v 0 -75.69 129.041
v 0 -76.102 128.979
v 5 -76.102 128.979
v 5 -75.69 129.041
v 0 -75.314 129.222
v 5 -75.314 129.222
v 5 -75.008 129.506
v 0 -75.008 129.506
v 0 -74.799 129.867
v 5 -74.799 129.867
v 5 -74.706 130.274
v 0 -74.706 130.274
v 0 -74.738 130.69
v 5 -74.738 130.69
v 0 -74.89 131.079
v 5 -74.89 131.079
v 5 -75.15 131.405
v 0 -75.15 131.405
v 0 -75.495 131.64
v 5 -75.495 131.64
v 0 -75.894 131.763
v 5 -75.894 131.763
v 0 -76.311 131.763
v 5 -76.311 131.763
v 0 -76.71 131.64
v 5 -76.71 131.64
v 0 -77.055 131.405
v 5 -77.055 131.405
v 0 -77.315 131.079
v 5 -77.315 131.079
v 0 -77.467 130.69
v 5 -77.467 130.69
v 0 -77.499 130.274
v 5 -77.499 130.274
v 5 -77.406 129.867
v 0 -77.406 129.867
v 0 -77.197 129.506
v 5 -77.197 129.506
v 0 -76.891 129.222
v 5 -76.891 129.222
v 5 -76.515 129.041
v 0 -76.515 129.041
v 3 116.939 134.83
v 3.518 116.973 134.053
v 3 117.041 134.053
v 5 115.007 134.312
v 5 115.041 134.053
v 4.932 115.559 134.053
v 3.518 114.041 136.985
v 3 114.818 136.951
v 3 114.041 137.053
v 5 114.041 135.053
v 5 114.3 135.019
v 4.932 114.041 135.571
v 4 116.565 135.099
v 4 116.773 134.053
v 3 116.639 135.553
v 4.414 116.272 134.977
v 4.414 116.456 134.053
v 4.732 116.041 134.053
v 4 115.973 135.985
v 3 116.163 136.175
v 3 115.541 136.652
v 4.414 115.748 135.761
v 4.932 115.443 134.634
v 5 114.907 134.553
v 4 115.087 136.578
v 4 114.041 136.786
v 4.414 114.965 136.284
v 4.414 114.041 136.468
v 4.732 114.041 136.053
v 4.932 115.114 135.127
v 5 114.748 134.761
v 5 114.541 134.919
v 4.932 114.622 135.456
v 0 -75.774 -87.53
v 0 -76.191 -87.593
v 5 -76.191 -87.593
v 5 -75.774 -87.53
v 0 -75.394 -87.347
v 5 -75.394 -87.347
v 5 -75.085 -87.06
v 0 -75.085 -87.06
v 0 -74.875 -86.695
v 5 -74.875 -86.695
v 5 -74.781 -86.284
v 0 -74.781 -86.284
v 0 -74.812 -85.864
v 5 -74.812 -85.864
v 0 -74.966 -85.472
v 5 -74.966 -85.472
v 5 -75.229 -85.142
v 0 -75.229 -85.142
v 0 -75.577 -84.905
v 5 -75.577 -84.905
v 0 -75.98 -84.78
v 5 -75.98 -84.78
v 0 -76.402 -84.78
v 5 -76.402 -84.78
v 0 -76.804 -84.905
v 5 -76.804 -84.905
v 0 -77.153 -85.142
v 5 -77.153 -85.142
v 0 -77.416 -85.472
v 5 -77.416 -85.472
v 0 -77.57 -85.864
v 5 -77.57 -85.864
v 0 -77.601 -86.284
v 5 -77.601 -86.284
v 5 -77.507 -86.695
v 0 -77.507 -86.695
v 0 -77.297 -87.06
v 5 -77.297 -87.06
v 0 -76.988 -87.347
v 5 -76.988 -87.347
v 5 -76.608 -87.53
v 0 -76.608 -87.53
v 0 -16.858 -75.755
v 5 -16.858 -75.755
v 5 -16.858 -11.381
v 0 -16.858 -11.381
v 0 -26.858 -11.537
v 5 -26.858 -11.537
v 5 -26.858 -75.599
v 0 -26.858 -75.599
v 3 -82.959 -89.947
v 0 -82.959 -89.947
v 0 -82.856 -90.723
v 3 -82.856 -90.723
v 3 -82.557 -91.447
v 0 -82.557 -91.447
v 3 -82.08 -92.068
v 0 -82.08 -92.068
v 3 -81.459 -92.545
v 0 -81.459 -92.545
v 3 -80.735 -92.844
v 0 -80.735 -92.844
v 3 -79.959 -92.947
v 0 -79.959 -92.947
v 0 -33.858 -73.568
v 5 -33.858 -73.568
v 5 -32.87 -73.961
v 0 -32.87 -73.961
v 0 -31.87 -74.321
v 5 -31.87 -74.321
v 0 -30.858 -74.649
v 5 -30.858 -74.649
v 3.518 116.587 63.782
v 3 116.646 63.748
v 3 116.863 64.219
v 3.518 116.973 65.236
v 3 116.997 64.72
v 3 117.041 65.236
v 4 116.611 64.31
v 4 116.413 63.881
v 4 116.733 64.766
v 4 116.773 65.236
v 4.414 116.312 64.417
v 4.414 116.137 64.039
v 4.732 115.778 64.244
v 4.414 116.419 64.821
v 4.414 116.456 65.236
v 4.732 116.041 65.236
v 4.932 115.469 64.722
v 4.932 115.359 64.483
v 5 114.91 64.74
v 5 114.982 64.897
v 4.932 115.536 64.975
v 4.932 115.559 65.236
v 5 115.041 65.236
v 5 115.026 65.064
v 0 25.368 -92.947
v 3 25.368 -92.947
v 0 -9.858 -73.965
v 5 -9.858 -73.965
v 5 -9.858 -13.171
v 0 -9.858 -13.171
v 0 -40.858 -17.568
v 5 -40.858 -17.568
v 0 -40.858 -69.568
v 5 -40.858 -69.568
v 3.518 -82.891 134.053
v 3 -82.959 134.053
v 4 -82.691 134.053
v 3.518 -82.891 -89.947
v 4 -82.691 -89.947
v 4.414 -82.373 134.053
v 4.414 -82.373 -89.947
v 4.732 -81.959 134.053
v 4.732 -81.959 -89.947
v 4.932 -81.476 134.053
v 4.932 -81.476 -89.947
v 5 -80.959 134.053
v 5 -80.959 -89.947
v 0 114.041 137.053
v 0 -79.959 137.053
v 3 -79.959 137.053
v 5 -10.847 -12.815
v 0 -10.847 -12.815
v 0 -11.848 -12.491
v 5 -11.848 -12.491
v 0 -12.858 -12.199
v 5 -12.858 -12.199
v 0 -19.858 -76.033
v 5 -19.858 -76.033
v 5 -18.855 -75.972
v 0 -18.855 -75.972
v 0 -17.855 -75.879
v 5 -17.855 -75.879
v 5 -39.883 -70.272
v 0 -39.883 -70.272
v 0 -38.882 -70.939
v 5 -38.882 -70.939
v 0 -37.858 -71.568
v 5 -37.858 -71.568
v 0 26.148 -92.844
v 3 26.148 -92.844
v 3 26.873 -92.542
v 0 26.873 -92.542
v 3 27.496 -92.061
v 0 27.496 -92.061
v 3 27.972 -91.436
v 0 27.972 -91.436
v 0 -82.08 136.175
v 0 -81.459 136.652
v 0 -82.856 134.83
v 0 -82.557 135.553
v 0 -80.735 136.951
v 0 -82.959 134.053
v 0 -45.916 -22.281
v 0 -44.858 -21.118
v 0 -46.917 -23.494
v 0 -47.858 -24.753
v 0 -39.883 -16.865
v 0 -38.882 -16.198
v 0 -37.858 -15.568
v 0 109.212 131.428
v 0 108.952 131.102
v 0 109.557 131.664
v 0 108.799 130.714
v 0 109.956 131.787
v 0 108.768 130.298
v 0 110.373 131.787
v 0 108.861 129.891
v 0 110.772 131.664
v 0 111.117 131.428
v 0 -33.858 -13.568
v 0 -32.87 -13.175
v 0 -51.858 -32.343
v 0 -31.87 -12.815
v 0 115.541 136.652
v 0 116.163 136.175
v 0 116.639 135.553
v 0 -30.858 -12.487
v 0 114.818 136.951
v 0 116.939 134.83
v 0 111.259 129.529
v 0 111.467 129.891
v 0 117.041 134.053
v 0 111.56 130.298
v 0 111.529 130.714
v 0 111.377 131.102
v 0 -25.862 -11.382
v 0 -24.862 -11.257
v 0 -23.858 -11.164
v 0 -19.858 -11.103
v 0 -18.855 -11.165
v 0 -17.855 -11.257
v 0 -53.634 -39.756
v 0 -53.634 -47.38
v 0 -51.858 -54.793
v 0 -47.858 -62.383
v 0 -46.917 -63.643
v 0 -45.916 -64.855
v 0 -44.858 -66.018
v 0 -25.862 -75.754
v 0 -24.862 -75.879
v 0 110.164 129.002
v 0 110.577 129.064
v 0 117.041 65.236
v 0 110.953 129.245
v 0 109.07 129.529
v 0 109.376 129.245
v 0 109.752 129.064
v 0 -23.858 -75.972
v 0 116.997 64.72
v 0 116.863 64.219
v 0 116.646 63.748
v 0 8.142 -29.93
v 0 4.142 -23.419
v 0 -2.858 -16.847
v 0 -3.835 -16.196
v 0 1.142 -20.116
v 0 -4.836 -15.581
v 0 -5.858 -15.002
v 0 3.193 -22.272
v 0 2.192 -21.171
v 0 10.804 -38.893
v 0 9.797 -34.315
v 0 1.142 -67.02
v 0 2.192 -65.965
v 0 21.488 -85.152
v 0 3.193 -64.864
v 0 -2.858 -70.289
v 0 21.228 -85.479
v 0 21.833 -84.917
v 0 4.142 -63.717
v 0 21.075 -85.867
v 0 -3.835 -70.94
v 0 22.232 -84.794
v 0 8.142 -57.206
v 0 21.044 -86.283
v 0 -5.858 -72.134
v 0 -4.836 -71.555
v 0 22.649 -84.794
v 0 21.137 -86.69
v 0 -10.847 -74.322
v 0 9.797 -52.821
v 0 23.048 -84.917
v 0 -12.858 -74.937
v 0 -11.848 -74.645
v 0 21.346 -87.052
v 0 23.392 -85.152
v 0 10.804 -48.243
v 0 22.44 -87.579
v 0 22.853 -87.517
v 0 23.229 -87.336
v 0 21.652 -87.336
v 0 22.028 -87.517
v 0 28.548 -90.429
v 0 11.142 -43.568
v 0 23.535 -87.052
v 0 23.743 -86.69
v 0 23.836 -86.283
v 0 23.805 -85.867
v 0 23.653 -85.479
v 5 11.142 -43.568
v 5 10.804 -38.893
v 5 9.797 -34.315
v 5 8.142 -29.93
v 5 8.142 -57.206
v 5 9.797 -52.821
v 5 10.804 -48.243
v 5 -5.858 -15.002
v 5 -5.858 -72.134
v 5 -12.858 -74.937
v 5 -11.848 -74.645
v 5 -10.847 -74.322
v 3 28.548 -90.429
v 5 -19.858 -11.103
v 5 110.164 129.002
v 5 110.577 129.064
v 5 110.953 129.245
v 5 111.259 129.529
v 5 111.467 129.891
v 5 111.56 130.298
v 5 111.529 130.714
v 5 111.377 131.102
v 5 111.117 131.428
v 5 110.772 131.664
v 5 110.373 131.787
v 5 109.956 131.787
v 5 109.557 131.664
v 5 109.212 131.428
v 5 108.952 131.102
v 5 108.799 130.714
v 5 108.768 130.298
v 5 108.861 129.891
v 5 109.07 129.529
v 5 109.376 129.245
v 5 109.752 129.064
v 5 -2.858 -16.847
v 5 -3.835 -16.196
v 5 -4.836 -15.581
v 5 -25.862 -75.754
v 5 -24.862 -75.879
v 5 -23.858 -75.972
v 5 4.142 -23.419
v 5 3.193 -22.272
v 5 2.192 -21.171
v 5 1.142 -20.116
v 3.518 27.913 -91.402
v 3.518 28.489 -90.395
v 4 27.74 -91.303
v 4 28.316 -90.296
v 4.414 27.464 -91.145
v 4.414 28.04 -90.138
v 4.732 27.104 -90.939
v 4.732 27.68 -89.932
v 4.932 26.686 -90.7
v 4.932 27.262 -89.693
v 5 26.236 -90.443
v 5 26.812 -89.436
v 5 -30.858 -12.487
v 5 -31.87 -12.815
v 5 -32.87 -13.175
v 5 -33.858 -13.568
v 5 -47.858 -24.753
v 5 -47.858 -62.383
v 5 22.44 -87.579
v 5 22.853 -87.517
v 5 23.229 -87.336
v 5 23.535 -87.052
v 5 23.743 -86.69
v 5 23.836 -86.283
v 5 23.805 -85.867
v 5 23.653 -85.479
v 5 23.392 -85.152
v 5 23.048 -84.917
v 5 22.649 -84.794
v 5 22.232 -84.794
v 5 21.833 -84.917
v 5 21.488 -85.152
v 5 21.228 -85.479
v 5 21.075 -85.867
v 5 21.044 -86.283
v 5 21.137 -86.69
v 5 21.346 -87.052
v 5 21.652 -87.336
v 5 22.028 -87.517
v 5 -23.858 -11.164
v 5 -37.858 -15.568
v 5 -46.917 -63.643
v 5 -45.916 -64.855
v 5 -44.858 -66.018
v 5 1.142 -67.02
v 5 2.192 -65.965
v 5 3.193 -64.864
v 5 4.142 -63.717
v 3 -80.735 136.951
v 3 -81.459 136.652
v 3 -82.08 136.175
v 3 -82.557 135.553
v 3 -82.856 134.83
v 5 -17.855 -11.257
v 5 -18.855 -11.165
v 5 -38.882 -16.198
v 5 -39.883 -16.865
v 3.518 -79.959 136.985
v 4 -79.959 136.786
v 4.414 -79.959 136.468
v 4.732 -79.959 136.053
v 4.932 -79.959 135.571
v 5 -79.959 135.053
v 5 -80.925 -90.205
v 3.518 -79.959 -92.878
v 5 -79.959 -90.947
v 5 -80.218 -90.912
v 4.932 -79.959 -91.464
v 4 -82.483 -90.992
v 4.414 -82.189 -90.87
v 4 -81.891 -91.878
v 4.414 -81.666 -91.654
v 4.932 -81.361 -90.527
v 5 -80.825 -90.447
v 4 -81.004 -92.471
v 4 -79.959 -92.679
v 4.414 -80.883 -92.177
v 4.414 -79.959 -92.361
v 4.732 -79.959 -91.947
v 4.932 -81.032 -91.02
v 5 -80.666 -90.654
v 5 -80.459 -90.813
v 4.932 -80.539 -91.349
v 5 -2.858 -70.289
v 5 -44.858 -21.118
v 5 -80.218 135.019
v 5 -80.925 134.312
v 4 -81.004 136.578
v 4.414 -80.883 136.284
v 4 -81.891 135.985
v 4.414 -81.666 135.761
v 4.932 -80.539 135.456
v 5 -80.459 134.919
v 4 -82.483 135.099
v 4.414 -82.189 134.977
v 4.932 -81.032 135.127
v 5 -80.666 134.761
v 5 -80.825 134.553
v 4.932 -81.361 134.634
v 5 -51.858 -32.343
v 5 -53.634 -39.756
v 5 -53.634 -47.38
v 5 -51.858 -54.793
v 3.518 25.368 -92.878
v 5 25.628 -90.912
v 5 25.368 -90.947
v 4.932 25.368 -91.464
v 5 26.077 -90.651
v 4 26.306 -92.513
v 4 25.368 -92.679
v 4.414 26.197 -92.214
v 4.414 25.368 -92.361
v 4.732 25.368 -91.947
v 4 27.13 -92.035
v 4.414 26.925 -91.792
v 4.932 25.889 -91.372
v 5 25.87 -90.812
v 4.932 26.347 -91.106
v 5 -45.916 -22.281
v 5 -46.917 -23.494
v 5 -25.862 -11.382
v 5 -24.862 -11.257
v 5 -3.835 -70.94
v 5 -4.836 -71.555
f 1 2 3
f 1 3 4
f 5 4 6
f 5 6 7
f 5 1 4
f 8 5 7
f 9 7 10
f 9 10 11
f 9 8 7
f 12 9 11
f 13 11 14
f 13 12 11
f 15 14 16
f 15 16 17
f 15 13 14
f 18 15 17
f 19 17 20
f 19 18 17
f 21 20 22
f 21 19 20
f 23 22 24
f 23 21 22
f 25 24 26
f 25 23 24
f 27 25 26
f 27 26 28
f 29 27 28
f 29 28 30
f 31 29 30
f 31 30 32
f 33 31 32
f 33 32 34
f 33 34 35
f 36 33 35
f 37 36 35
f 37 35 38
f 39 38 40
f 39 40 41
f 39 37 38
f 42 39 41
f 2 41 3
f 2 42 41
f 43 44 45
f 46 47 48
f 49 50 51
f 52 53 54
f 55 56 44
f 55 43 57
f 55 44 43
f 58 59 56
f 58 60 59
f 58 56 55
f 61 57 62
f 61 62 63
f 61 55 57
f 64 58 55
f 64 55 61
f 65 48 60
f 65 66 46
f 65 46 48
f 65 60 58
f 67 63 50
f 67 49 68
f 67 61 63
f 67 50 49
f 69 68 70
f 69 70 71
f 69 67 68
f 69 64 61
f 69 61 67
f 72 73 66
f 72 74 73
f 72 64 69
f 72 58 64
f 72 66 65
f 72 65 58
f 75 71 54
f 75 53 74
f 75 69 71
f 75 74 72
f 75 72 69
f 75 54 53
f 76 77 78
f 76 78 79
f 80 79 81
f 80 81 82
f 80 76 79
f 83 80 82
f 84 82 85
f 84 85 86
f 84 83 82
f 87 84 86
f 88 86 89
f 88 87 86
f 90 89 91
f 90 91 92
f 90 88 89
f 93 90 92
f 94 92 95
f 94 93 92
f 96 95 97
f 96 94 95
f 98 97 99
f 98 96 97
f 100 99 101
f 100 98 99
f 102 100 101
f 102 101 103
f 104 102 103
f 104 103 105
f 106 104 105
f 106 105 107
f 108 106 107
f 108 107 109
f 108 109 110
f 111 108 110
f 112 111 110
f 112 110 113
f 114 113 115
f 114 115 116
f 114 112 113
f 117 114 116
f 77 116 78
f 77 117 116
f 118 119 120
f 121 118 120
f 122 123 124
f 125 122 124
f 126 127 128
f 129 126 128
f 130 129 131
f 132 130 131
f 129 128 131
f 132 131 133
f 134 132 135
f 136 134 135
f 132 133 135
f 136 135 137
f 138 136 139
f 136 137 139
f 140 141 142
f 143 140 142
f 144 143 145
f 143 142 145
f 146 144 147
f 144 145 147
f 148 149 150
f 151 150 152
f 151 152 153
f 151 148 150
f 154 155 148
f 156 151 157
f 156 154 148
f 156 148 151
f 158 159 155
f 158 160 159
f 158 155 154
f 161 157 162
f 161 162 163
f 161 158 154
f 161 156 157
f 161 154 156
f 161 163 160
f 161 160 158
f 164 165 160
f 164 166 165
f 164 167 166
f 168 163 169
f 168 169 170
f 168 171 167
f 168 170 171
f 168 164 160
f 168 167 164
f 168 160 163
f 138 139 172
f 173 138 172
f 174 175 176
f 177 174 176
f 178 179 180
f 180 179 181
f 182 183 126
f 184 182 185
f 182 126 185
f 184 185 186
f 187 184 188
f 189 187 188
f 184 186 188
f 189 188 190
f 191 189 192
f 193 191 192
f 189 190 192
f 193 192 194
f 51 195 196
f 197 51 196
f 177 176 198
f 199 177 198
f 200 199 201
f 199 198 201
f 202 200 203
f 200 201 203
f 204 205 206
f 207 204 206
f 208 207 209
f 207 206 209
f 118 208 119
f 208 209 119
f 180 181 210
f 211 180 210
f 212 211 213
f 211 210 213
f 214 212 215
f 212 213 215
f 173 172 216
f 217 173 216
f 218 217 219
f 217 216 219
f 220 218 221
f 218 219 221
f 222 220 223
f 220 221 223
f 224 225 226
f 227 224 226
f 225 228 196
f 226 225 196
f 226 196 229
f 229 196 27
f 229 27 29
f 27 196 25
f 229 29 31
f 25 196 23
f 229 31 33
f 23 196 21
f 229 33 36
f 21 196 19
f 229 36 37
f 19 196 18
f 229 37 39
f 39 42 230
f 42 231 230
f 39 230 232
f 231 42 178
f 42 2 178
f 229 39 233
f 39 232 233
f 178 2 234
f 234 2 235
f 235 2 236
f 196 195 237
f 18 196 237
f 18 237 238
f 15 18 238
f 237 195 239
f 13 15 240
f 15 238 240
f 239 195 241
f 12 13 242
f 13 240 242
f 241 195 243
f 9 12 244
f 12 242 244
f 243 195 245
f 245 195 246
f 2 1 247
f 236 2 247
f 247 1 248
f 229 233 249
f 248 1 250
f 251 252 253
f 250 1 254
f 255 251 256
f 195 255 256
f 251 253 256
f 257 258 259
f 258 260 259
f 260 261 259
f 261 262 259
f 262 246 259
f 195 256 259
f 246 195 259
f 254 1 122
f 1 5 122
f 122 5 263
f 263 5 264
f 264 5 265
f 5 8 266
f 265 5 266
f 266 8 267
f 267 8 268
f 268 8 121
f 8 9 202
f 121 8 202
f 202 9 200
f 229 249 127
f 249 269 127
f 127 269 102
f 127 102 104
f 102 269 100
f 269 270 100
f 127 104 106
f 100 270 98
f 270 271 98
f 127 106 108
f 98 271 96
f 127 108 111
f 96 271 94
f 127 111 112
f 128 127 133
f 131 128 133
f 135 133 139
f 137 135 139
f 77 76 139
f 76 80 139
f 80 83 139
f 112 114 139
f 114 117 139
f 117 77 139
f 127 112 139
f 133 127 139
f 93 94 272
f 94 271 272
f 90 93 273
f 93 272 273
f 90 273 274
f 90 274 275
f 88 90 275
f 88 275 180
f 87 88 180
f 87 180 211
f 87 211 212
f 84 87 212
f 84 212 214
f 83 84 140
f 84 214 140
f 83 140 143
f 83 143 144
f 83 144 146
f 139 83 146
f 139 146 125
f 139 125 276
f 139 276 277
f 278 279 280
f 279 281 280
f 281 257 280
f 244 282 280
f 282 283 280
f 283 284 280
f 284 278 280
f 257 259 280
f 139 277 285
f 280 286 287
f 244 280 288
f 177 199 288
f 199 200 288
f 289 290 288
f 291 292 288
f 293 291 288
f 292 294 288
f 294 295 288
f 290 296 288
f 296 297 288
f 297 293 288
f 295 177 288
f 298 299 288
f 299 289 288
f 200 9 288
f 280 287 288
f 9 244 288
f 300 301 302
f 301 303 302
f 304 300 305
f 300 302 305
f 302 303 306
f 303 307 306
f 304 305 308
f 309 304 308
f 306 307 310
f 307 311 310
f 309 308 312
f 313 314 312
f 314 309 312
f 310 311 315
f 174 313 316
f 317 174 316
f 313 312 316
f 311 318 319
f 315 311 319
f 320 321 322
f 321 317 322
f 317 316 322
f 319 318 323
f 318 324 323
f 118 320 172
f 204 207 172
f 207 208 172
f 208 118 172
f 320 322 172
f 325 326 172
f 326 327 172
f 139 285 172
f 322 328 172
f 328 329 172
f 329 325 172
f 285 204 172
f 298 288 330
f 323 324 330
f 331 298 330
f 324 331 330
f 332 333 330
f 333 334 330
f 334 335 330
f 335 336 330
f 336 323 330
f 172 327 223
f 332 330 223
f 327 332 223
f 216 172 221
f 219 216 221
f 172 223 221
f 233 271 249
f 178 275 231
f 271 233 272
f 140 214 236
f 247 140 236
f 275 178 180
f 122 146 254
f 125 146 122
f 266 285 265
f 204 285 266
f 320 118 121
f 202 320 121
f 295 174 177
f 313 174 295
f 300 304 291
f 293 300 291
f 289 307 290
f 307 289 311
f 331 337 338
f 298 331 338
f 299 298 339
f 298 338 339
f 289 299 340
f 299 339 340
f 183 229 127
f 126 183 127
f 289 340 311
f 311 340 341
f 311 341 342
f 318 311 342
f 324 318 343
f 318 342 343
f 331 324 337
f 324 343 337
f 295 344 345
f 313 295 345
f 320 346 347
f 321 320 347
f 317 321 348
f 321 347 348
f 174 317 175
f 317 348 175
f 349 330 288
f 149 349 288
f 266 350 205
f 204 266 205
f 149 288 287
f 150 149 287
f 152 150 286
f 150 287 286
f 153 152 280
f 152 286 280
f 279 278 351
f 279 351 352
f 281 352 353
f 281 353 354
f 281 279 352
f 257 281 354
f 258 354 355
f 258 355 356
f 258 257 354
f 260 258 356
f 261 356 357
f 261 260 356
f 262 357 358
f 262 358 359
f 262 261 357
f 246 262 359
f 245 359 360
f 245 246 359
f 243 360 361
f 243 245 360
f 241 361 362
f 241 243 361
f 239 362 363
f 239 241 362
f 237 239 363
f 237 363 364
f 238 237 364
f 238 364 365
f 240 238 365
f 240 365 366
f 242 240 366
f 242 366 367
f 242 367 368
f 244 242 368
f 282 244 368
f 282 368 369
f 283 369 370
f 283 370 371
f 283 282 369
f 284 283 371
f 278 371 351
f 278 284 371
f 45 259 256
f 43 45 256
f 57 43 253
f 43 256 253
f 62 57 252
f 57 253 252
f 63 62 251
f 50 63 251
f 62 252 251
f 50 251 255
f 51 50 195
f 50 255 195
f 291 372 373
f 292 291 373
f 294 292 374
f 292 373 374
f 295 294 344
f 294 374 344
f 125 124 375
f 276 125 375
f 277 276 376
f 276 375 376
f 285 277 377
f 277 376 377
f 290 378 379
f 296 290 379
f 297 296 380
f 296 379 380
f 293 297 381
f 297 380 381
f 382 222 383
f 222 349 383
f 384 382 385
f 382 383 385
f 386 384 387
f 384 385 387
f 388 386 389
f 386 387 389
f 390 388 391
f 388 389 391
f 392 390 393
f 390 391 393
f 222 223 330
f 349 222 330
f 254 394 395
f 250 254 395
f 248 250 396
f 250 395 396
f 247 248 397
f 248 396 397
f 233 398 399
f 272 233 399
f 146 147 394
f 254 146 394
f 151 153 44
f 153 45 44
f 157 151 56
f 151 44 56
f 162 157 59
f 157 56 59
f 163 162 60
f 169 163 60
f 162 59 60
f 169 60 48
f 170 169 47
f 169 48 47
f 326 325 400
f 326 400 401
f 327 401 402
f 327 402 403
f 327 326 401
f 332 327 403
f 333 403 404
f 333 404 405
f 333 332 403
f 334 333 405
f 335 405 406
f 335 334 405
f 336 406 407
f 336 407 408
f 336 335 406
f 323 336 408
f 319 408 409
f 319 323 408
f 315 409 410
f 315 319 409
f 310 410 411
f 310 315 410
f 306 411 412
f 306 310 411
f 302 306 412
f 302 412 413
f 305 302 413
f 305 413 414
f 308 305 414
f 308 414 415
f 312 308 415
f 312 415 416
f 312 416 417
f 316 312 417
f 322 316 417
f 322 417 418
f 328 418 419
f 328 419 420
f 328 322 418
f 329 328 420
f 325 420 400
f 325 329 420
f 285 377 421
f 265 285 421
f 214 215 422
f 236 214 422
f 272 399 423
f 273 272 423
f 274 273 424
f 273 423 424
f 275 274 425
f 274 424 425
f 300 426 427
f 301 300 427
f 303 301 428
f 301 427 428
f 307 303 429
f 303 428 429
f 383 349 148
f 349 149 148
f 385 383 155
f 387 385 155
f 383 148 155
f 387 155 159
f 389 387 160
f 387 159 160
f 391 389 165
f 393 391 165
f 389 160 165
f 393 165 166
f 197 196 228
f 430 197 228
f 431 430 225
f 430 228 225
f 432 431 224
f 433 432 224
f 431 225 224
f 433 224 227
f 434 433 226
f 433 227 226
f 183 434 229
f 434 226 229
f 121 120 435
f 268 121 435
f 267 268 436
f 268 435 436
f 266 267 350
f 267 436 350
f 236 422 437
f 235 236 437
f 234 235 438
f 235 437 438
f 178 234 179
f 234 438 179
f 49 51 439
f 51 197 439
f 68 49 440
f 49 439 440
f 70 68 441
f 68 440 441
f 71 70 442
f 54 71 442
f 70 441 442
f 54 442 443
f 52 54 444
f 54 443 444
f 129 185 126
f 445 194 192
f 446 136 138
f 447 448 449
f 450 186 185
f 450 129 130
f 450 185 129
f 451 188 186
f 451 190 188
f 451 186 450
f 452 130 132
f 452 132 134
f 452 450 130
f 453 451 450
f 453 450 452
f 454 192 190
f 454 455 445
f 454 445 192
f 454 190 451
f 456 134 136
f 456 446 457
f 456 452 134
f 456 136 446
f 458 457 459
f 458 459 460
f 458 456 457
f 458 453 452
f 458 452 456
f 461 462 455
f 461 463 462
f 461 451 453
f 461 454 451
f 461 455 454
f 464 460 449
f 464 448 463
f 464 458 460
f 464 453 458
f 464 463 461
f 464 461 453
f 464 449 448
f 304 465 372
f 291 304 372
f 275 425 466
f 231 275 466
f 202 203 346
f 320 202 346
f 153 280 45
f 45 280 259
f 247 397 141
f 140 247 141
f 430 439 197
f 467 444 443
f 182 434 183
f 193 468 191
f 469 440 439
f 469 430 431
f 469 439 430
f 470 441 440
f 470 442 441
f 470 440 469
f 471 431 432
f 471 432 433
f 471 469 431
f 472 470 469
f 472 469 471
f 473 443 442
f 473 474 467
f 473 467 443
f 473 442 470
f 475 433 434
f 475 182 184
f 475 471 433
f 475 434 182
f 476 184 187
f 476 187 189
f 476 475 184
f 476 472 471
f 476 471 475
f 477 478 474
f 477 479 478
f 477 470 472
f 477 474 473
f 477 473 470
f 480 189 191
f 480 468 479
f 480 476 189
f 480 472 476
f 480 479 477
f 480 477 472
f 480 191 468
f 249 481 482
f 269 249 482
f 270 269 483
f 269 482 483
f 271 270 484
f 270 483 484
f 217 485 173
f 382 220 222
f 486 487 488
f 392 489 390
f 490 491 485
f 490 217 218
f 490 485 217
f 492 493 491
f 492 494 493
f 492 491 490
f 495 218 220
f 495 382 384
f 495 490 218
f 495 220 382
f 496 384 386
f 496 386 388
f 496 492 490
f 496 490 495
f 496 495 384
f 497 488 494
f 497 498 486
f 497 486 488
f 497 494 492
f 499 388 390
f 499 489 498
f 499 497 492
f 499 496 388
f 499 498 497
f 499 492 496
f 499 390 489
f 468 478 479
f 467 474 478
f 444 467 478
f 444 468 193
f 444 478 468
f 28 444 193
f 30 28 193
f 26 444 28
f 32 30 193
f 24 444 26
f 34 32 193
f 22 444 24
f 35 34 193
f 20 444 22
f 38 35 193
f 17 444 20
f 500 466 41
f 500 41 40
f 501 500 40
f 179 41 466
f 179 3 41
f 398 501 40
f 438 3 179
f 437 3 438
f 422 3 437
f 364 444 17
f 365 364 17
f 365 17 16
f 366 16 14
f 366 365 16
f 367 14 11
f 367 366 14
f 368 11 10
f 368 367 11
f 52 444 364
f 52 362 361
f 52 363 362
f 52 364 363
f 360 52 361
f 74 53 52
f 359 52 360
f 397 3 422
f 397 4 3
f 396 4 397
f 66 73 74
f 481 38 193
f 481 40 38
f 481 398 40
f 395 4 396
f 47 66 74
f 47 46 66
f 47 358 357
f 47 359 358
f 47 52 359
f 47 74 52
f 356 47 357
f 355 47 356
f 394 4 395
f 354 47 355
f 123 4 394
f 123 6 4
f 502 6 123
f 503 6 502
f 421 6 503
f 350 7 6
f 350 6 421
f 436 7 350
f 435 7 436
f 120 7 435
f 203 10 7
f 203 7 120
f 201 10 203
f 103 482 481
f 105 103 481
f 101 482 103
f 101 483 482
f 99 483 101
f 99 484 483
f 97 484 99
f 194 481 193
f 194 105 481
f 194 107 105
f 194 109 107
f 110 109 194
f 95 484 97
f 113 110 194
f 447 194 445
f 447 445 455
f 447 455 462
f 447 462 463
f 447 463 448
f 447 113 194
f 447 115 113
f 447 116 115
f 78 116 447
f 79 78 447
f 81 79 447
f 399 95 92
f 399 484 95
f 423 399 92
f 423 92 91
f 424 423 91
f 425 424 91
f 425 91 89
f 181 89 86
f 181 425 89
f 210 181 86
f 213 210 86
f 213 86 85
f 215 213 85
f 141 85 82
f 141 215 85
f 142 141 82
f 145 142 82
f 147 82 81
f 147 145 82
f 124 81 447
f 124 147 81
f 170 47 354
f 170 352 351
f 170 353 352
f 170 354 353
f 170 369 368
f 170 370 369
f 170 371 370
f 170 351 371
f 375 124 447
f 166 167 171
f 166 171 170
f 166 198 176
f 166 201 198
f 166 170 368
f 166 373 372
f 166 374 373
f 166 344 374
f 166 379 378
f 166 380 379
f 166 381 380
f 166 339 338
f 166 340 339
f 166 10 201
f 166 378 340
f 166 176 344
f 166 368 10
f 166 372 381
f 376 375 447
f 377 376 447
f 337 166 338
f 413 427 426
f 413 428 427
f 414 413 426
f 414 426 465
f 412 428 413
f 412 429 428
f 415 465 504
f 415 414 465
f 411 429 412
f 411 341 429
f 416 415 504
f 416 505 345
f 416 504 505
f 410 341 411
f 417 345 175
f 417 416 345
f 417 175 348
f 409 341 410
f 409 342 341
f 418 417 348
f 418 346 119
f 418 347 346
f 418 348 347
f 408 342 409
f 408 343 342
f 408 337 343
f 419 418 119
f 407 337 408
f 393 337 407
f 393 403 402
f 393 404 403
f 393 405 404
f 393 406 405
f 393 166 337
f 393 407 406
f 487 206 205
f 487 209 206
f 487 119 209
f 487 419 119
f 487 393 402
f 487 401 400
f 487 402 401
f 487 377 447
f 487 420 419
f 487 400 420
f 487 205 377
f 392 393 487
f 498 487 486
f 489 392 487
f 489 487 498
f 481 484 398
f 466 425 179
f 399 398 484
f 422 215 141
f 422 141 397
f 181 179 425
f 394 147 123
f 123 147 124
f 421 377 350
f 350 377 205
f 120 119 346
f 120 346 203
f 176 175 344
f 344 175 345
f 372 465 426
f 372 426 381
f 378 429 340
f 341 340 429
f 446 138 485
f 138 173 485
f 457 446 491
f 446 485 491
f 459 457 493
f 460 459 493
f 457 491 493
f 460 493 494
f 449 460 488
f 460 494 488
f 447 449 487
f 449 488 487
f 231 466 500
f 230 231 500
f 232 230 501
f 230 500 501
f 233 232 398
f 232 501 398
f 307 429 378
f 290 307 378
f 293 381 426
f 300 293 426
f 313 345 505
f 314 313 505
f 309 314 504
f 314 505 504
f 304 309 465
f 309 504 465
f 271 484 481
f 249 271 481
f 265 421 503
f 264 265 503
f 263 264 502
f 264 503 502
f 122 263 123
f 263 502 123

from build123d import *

# Parameters (mm, degrees)
SKETCH2_R           = 1.4
SKETCH2_R_2         = 1.414097505
BOSS_EXTRUDE2_DEPTH = 5
CUT_EXTRUDE1_DEPTH  = 5
FILLET4_R           = 2


with BuildPart() as part:
    # Sketch2 → Boss-Extrude2 (new body)
    with BuildSketch(Plane(origin=(0, 0, 0), x_dir=(0, 0, -1), z_dir=(1, 0, 0))):
        with BuildLine():
            Line((-137.05346623, 114.041314814), (-137.05346623, -79.958685186))
            ThreePointArc((-137.05346623, -79.958685186), (-136.174786573, -82.08000553), (-134.05346623, -82.958685186))
            Line((-134.05346623, -82.958685186), (89.94653377, -82.958685186))
            ThreePointArc((89.94653377, -82.958685186), (92.067854114, -82.08000553), (92.94653377, -79.958685186))
            Line((92.94653377, -79.958685186), (92.94653377, 25.368162352))
            ThreePointArc((92.94653377, 25.368162352), (92.541535124, 26.8734756), (91.435888454, 27.97235563))
            Line((91.435888454, 27.97235563), (90.428791577, 28.548320734))
            Line((90.428791577, 28.548320734), (-63.7480103, 116.646068127))
            ThreePointArc((-63.7480103, 116.646068127), (-64.466404774, 116.940819939), (-65.236385313, 117.041314814))
            Line((-65.236385313, 117.041314814), (-134.05346623, 117.041314814))
            ThreePointArc((-134.05346623, 117.041314814), (-136.174786573, 116.162635157), (-137.05346623, 114.041314814))
        make_face()
        with Locations((-130.402194721, 110.164268622)):
            Circle(SKETCH2_R, mode=Mode.SUBTRACT)
        with Locations((-130.378834203, -76.102450402)):
            Circle(SKETCH2_R, mode=Mode.SUBTRACT)
        with Locations((86.178766817, -76.190918233)):
            Circle(SKETCH2_R_2, mode=Mode.SUBTRACT)
        with Locations((86.178766817, 22.440231448)):
            Circle(SKETCH2_R, mode=Mode.SUBTRACT)
    extrude(amount=BOSS_EXTRUDE2_DEPTH)

    # Sketch3 → Cut-Extrude1 (cut)
    with BuildSketch(Plane(origin=(5, 0, 0), x_dir=(0, 0, -1), z_dir=(1, 0, 0))):
        with BuildLine():
            ThreePointArc((43.568031387, 11.142105509), (36.585911365, 10.383246006), (29.92984969, 8.142105509))
            Line((29.92984969, 8.142105509), (57.206213084, 8.142105509))
            ThreePointArc((57.206213084, 8.142105509), (50.550151409, 10.383246006), (43.568031387, 11.142105509))
        make_face()
        with BuildLine():
            ThreePointArc((23.418589707, 4.142105509), (21.715728373, 2.69884787), (20.115952588, 1.142105509))
            Line((20.115952588, 1.142105509), (67.020110186, 1.142105509))
            ThreePointArc((67.020110186, 1.142105509), (65.420334401, 2.69884787), (63.717473066, 4.142105509))
            Line((63.717473066, 4.142105509), (23.418589707, 4.142105509))
        make_face()
        with BuildLine():
            Line((70.288809819, -2.857894491), (16.847252955, -2.857894491))
            ThreePointArc((16.847252955, -2.857894491), (15.884118126, -4.332885047), (15.002317673, -5.857894491))
            Line((15.002317673, -5.857894491), (72.133745101, -5.857894491))
            ThreePointArc((72.133745101, -5.857894491), (71.251944648, -4.332885047), (70.288809819, -2.857894491))
        make_face()
        with BuildLine():
            Line((73.965399694, -9.857894491), (13.17066308, -9.857894491))
            ThreePointArc((13.17066308, -9.857894491), (12.648553826, -11.346106069), (12.199257104, -12.857894491))
            Line((12.199257104, -12.857894491), (74.93680567, -12.857894491))
            ThreePointArc((74.93680567, -12.857894491), (74.487508947, -11.346106069), (73.965399694, -9.857894491))
        make_face()
        with BuildLine():
            Line((75.754985266, -16.857894491), (11.381077508, -16.857894491))
            ThreePointArc((11.381077508, -16.857894491), (11.207088544, -18.354666502), (11.102665225, -19.857894491))
            Line((11.102665225, -19.857894491), (76.033397548, -19.857894491))
            ThreePointArc((76.033397548, -19.857894491), (75.928974229, -18.354666502), (75.754985266, -16.857894491))
        make_face()
        with BuildLine():
            Line((75.971734879, -23.857894491), (11.164327895, -23.857894491))
            ThreePointArc((11.164327895, -23.857894491), (11.315662222, -25.362227549), (11.536796631, -26.857894491))
            Line((11.536796631, -26.857894491), (75.599266143, -26.857894491))
            ThreePointArc((75.599266143, -26.857894491), (75.820400552, -25.362227549), (75.971734879, -23.857894491))
        make_face()
        with BuildLine():
            Line((74.648571923, -30.857894491), (12.487490851, -30.857894491))
            ThreePointArc((12.487490851, -30.857894491), (12.990946698, -32.371154315), (13.568031387, -33.857894491))
            Line((13.568031387, -33.857894491), (73.568031387, -33.857894491))
            ThreePointArc((73.568031387, -33.857894491), (74.145116075, -32.371154315), (74.648571923, -30.857894491))
        make_face()
        with BuildLine():
            Line((71.568031387, -37.857894491), (15.568031387, -37.857894491))
            ThreePointArc((15.568031387, -37.857894491), (16.526396821, -39.385650868), (17.568031387, -40.857894491))
            Line((17.568031387, -40.857894491), (69.568031387, -40.857894491))
            ThreePointArc((69.568031387, -40.857894491), (70.609665953, -39.385650868), (71.568031387, -37.857894491))
        make_face()
        with BuildLine():
            Line((66.017975707, -44.857894491), (21.118087066, -44.857894491))
            ThreePointArc((21.118087066, -44.857894491), (22.881161375, -46.423875603), (24.753143665, -47.857894491))
            Line((24.753143665, -47.857894491), (62.382919109, -47.857894491))
            ThreePointArc((62.382919109, -47.857894491), (64.254901399, -46.423875603), (66.017975707, -44.857894491))
        make_face()
        with BuildLine():
            Line((54.793003547, -51.857894491), (32.343059226, -51.857894491))
            ThreePointArc((32.343059226, -51.857894491), (43.568031387, -53.857894491), (54.793003547, -51.857894491))
        make_face()
    extrude(amount=-CUT_EXTRUDE1_DEPTH, mode=Mode.SUBTRACT)

    # Fillet4
    fillet4_edges = [part.edges().sort_by_distance(p)[0] for p in [
        (5, -82.08000553, 136.174786573),
        (5, -82.958685186, 22.05346623),
        (5, -82.08000553, -92.067854114),
        (5, -27.295261417, -92.94653377),
        (5, 26.8734756, -92.541535124),
        (5, 28.260338182, -90.932340015),
        (5, 72.59719443, -13.340390638),
        (5, 116.940819939, 64.466404774),
        (5, 117.041314814, 99.644925771),
        (5, 116.162635157, 136.174786573),
        (5, 17.041314814, 137.05346623),
    ]]
    fillet(fillet4_edges, radius=FILLET4_R)


solid = part.part
